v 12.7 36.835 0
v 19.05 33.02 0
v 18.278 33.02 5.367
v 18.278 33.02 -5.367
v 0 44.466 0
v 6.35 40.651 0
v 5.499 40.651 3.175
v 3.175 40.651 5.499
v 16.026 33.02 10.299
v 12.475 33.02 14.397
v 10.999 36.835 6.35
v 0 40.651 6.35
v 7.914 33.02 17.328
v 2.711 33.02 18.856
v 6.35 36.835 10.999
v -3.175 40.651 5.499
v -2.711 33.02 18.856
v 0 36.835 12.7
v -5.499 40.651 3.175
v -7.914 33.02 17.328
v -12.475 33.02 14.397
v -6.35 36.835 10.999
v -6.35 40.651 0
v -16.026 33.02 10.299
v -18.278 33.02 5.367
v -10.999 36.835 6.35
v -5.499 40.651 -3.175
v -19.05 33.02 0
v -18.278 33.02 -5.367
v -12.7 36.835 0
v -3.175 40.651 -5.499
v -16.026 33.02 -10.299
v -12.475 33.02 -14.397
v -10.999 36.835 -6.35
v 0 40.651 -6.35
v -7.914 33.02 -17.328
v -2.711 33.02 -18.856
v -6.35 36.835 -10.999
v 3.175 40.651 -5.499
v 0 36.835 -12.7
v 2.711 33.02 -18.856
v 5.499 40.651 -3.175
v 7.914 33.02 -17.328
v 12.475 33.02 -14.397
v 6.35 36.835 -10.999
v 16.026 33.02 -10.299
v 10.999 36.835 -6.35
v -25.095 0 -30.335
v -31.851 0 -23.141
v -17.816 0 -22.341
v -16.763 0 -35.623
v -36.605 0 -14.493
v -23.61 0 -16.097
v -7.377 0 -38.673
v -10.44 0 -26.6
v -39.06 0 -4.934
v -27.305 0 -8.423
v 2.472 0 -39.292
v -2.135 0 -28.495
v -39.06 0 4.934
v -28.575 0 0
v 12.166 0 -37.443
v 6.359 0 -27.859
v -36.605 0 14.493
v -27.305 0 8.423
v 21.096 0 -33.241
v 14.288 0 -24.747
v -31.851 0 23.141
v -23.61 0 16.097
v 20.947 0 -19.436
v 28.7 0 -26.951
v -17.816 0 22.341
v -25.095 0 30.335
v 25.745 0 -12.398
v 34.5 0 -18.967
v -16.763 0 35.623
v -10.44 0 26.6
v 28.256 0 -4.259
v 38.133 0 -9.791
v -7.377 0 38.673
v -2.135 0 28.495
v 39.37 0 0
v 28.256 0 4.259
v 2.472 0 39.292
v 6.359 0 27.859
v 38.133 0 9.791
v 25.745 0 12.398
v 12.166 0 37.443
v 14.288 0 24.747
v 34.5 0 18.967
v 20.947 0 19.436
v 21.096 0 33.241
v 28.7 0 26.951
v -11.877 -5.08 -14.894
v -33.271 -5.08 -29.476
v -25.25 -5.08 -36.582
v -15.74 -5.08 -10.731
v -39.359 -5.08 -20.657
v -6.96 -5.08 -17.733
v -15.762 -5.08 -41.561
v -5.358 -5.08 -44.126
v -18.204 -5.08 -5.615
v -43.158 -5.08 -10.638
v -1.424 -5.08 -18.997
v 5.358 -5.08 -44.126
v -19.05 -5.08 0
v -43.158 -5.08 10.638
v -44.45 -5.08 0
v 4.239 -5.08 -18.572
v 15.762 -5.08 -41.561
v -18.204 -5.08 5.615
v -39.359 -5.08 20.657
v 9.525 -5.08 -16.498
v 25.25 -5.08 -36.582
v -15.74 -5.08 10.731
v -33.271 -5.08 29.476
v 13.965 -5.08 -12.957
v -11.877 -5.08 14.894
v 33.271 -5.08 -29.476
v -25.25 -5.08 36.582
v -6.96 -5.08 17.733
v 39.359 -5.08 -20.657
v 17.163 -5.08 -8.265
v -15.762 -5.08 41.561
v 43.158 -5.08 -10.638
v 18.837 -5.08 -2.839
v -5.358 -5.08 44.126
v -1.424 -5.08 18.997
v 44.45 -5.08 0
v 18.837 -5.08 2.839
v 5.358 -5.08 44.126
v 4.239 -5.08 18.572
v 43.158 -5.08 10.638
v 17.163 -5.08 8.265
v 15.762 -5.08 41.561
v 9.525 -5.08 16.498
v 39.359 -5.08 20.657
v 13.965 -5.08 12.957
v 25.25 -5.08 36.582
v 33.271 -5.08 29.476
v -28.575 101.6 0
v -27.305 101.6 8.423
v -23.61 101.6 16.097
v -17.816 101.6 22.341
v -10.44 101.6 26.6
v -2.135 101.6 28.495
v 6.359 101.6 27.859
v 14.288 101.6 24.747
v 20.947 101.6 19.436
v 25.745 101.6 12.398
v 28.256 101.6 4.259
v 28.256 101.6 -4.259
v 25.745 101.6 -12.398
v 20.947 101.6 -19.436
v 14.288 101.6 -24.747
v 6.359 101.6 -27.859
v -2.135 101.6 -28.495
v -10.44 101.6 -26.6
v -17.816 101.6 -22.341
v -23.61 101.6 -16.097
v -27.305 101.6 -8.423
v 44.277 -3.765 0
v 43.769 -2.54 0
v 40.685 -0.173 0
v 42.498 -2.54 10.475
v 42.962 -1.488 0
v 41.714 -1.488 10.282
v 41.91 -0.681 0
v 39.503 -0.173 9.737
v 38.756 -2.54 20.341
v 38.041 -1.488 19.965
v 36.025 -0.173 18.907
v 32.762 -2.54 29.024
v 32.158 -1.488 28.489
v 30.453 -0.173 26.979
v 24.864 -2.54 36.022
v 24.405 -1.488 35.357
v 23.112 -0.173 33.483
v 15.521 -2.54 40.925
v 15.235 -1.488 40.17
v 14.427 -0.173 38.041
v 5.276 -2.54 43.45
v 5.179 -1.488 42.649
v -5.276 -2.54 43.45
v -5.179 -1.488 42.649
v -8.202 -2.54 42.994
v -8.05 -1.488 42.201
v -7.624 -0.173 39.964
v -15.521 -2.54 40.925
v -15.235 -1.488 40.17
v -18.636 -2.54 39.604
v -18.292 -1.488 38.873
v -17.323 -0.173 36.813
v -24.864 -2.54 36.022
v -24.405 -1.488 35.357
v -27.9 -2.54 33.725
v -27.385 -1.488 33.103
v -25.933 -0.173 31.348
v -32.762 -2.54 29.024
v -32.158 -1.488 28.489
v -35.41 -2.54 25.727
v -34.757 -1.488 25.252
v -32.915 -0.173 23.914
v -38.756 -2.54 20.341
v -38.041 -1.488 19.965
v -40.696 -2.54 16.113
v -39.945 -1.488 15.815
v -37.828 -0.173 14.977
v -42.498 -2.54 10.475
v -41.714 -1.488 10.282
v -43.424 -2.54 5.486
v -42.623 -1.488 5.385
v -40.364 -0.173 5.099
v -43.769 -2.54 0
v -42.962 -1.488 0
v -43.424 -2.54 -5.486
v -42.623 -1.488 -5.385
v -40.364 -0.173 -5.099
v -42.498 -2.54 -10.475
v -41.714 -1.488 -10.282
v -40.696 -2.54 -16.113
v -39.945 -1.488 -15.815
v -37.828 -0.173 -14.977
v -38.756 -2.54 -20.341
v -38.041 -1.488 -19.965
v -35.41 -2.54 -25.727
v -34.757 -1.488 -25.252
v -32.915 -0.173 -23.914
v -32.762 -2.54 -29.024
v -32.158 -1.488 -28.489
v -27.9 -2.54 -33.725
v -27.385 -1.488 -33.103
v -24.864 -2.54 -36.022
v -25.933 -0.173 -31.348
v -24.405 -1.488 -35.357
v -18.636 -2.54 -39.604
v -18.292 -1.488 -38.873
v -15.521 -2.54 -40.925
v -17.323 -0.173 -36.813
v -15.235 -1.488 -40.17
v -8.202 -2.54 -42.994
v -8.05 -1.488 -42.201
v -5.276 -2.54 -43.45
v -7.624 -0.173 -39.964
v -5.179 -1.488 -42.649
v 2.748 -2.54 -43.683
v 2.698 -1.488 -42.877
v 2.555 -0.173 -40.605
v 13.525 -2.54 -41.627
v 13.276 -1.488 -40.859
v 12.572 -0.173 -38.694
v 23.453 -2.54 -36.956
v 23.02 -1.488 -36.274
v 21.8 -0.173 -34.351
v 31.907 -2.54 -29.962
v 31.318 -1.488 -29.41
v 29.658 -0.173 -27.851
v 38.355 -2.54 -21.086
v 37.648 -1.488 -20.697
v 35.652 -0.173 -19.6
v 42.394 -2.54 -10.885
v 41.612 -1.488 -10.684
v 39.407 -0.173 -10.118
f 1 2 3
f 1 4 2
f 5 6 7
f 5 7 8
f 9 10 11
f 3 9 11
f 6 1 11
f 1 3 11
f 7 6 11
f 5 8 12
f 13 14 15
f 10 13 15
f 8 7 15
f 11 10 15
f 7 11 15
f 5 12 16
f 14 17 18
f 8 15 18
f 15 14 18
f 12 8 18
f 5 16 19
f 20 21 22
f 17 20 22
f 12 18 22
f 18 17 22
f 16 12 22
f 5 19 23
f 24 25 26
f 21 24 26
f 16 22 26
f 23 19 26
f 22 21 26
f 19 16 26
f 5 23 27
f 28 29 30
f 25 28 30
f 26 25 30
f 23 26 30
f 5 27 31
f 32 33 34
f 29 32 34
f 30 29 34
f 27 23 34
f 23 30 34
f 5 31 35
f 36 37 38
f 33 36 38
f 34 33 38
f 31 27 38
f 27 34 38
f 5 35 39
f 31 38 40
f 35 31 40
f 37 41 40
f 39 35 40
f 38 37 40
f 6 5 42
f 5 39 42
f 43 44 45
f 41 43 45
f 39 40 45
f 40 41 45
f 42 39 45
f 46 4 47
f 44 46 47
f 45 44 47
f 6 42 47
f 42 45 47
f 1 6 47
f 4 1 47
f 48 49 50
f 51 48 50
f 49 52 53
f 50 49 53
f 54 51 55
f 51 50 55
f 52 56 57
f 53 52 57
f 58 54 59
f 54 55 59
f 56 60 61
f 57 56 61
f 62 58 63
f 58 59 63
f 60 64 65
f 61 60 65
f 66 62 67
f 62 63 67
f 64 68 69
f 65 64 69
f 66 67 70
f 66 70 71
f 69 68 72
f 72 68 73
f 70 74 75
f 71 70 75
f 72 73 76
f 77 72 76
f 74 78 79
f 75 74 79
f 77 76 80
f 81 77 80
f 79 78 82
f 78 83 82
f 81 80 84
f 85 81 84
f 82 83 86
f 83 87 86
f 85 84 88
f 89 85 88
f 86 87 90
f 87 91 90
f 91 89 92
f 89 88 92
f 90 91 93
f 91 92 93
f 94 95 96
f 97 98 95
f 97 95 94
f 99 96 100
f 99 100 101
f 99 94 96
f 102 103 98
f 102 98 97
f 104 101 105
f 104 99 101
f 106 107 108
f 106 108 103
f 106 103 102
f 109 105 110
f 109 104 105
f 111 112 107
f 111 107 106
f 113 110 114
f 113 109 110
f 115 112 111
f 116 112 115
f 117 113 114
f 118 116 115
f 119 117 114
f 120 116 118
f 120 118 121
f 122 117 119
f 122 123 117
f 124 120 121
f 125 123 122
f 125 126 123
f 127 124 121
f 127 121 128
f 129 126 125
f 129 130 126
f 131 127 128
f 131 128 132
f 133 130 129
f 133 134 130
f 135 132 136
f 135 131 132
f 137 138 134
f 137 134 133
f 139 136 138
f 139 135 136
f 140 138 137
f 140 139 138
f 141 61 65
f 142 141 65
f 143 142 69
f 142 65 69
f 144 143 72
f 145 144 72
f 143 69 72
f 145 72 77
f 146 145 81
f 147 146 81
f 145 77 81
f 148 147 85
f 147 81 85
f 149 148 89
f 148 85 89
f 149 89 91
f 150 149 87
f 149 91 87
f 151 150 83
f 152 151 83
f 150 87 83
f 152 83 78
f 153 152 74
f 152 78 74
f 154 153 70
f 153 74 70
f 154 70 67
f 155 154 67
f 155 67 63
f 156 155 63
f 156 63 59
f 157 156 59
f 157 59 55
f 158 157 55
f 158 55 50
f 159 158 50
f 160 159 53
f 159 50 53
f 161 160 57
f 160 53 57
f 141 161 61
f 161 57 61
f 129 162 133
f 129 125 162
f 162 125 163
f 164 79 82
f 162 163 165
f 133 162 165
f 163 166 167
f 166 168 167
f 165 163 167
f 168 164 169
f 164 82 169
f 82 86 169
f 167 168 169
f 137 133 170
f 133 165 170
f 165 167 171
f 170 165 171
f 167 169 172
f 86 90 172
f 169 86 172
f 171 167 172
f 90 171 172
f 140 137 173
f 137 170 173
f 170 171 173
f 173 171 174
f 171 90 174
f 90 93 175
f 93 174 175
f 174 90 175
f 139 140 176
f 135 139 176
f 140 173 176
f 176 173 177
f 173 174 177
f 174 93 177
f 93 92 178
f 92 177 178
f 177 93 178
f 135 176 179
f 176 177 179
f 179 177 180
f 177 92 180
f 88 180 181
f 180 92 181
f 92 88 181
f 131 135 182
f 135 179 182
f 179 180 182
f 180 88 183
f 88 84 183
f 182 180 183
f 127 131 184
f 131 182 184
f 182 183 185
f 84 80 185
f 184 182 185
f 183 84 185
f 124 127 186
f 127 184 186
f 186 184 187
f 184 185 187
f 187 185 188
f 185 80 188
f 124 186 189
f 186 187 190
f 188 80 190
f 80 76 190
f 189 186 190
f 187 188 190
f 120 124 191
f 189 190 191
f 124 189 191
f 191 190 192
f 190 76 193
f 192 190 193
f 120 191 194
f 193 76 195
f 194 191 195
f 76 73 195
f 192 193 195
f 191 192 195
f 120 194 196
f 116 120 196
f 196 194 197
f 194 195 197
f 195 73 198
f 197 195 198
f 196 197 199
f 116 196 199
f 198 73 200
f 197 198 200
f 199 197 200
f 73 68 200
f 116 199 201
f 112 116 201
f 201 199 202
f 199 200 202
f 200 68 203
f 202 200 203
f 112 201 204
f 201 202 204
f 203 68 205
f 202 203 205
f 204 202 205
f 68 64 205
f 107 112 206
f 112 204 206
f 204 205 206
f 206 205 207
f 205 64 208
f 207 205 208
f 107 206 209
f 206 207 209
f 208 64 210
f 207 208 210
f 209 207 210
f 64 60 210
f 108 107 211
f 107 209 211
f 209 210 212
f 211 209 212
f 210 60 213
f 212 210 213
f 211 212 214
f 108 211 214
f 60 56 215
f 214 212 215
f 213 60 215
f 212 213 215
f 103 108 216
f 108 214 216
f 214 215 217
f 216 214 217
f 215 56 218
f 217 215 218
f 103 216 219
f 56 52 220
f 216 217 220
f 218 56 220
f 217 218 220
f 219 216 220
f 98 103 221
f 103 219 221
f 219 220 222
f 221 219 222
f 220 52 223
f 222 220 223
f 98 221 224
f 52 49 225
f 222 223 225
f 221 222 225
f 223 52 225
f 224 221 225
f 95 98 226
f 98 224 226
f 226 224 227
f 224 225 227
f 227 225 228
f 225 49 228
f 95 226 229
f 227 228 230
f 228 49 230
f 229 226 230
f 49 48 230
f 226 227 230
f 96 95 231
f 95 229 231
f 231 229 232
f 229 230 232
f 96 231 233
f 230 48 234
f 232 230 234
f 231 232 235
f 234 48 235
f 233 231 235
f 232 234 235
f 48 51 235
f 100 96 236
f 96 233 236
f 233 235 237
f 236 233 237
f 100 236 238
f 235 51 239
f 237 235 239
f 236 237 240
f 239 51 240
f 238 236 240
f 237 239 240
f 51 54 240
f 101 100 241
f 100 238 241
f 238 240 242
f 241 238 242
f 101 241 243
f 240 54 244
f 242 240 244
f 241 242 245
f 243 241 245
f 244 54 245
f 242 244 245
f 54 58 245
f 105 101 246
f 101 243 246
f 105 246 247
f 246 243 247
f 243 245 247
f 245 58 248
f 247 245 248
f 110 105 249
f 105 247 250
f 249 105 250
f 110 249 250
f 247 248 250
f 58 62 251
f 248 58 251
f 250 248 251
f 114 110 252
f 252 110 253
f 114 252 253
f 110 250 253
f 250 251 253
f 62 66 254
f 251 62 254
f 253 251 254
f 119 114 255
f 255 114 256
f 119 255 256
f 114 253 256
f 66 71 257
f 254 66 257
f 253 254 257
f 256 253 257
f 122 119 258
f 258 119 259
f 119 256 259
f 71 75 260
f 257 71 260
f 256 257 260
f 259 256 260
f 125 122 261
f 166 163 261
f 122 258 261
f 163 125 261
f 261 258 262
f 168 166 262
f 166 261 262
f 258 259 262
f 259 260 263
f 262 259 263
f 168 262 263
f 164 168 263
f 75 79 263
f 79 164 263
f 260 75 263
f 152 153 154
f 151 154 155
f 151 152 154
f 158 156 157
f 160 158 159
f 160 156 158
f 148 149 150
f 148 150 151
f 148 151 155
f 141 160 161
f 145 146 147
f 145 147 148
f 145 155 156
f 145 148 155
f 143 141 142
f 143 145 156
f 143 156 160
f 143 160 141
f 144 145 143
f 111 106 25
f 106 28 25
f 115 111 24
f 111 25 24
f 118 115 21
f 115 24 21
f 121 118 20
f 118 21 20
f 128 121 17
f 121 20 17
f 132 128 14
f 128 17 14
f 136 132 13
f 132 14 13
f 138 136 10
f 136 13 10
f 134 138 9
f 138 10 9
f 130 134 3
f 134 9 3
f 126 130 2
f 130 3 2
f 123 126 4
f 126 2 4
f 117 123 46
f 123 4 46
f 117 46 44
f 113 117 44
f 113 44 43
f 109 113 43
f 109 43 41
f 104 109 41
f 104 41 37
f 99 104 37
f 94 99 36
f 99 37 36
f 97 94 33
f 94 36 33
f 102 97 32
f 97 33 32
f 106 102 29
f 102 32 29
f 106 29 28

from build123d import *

# Parameters (mm, degrees)
F0_R     = 44.45
F1_DEPTH = 5.08
F2_R     = 5.07999
F4_R     = 28.575
F5_DEPTH = 101.6
F6_D     = 38.1
F6_DEPTH = 38.1
F6_TIP   = 11.4463947925


# Not quite as in the source:
# - a fillet or chamfer is up to 0.001 mm smaller than in the source, because OpenCascade refuses the exact size


with BuildPart() as f1:
    # F0 (on Front) → F1 (new body)
    with BuildSketch(Plane.XZ):
        Circle(F0_R)
    extrude(amount=F1_DEPTH)

    # F2 (radius 5.08 in the source; OpenCascade refuses exactly that, so slightly less here)
    f2_edges = [f1.edges().sort_by_distance(p)[0] for p in [
        (-44.45, 0, 0),
    ]]
    fillet(f2_edges, radius=F2_R)

    # F4 (on face) → F5 (join)
    with BuildSketch(Plane(origin=(0, 0, 0), x_dir=(-1, 0, 0), z_dir=(0, 1, 0))):
        Circle(F4_R)
    extrude(amount=F5_DEPTH)

    # F6
    with Locations(Plane.XZ.offset(5.08)):
        with Locations((0, 0)):
            Hole(F6_D / 2, depth=F6_DEPTH)
            with Locations((0, 0, -(F6_DEPTH + F6_TIP / 2))):  # 118° drill point
                Cone(0, F6_D / 2, F6_TIP, mode=Mode.SUBTRACT)


solid = f1.part
